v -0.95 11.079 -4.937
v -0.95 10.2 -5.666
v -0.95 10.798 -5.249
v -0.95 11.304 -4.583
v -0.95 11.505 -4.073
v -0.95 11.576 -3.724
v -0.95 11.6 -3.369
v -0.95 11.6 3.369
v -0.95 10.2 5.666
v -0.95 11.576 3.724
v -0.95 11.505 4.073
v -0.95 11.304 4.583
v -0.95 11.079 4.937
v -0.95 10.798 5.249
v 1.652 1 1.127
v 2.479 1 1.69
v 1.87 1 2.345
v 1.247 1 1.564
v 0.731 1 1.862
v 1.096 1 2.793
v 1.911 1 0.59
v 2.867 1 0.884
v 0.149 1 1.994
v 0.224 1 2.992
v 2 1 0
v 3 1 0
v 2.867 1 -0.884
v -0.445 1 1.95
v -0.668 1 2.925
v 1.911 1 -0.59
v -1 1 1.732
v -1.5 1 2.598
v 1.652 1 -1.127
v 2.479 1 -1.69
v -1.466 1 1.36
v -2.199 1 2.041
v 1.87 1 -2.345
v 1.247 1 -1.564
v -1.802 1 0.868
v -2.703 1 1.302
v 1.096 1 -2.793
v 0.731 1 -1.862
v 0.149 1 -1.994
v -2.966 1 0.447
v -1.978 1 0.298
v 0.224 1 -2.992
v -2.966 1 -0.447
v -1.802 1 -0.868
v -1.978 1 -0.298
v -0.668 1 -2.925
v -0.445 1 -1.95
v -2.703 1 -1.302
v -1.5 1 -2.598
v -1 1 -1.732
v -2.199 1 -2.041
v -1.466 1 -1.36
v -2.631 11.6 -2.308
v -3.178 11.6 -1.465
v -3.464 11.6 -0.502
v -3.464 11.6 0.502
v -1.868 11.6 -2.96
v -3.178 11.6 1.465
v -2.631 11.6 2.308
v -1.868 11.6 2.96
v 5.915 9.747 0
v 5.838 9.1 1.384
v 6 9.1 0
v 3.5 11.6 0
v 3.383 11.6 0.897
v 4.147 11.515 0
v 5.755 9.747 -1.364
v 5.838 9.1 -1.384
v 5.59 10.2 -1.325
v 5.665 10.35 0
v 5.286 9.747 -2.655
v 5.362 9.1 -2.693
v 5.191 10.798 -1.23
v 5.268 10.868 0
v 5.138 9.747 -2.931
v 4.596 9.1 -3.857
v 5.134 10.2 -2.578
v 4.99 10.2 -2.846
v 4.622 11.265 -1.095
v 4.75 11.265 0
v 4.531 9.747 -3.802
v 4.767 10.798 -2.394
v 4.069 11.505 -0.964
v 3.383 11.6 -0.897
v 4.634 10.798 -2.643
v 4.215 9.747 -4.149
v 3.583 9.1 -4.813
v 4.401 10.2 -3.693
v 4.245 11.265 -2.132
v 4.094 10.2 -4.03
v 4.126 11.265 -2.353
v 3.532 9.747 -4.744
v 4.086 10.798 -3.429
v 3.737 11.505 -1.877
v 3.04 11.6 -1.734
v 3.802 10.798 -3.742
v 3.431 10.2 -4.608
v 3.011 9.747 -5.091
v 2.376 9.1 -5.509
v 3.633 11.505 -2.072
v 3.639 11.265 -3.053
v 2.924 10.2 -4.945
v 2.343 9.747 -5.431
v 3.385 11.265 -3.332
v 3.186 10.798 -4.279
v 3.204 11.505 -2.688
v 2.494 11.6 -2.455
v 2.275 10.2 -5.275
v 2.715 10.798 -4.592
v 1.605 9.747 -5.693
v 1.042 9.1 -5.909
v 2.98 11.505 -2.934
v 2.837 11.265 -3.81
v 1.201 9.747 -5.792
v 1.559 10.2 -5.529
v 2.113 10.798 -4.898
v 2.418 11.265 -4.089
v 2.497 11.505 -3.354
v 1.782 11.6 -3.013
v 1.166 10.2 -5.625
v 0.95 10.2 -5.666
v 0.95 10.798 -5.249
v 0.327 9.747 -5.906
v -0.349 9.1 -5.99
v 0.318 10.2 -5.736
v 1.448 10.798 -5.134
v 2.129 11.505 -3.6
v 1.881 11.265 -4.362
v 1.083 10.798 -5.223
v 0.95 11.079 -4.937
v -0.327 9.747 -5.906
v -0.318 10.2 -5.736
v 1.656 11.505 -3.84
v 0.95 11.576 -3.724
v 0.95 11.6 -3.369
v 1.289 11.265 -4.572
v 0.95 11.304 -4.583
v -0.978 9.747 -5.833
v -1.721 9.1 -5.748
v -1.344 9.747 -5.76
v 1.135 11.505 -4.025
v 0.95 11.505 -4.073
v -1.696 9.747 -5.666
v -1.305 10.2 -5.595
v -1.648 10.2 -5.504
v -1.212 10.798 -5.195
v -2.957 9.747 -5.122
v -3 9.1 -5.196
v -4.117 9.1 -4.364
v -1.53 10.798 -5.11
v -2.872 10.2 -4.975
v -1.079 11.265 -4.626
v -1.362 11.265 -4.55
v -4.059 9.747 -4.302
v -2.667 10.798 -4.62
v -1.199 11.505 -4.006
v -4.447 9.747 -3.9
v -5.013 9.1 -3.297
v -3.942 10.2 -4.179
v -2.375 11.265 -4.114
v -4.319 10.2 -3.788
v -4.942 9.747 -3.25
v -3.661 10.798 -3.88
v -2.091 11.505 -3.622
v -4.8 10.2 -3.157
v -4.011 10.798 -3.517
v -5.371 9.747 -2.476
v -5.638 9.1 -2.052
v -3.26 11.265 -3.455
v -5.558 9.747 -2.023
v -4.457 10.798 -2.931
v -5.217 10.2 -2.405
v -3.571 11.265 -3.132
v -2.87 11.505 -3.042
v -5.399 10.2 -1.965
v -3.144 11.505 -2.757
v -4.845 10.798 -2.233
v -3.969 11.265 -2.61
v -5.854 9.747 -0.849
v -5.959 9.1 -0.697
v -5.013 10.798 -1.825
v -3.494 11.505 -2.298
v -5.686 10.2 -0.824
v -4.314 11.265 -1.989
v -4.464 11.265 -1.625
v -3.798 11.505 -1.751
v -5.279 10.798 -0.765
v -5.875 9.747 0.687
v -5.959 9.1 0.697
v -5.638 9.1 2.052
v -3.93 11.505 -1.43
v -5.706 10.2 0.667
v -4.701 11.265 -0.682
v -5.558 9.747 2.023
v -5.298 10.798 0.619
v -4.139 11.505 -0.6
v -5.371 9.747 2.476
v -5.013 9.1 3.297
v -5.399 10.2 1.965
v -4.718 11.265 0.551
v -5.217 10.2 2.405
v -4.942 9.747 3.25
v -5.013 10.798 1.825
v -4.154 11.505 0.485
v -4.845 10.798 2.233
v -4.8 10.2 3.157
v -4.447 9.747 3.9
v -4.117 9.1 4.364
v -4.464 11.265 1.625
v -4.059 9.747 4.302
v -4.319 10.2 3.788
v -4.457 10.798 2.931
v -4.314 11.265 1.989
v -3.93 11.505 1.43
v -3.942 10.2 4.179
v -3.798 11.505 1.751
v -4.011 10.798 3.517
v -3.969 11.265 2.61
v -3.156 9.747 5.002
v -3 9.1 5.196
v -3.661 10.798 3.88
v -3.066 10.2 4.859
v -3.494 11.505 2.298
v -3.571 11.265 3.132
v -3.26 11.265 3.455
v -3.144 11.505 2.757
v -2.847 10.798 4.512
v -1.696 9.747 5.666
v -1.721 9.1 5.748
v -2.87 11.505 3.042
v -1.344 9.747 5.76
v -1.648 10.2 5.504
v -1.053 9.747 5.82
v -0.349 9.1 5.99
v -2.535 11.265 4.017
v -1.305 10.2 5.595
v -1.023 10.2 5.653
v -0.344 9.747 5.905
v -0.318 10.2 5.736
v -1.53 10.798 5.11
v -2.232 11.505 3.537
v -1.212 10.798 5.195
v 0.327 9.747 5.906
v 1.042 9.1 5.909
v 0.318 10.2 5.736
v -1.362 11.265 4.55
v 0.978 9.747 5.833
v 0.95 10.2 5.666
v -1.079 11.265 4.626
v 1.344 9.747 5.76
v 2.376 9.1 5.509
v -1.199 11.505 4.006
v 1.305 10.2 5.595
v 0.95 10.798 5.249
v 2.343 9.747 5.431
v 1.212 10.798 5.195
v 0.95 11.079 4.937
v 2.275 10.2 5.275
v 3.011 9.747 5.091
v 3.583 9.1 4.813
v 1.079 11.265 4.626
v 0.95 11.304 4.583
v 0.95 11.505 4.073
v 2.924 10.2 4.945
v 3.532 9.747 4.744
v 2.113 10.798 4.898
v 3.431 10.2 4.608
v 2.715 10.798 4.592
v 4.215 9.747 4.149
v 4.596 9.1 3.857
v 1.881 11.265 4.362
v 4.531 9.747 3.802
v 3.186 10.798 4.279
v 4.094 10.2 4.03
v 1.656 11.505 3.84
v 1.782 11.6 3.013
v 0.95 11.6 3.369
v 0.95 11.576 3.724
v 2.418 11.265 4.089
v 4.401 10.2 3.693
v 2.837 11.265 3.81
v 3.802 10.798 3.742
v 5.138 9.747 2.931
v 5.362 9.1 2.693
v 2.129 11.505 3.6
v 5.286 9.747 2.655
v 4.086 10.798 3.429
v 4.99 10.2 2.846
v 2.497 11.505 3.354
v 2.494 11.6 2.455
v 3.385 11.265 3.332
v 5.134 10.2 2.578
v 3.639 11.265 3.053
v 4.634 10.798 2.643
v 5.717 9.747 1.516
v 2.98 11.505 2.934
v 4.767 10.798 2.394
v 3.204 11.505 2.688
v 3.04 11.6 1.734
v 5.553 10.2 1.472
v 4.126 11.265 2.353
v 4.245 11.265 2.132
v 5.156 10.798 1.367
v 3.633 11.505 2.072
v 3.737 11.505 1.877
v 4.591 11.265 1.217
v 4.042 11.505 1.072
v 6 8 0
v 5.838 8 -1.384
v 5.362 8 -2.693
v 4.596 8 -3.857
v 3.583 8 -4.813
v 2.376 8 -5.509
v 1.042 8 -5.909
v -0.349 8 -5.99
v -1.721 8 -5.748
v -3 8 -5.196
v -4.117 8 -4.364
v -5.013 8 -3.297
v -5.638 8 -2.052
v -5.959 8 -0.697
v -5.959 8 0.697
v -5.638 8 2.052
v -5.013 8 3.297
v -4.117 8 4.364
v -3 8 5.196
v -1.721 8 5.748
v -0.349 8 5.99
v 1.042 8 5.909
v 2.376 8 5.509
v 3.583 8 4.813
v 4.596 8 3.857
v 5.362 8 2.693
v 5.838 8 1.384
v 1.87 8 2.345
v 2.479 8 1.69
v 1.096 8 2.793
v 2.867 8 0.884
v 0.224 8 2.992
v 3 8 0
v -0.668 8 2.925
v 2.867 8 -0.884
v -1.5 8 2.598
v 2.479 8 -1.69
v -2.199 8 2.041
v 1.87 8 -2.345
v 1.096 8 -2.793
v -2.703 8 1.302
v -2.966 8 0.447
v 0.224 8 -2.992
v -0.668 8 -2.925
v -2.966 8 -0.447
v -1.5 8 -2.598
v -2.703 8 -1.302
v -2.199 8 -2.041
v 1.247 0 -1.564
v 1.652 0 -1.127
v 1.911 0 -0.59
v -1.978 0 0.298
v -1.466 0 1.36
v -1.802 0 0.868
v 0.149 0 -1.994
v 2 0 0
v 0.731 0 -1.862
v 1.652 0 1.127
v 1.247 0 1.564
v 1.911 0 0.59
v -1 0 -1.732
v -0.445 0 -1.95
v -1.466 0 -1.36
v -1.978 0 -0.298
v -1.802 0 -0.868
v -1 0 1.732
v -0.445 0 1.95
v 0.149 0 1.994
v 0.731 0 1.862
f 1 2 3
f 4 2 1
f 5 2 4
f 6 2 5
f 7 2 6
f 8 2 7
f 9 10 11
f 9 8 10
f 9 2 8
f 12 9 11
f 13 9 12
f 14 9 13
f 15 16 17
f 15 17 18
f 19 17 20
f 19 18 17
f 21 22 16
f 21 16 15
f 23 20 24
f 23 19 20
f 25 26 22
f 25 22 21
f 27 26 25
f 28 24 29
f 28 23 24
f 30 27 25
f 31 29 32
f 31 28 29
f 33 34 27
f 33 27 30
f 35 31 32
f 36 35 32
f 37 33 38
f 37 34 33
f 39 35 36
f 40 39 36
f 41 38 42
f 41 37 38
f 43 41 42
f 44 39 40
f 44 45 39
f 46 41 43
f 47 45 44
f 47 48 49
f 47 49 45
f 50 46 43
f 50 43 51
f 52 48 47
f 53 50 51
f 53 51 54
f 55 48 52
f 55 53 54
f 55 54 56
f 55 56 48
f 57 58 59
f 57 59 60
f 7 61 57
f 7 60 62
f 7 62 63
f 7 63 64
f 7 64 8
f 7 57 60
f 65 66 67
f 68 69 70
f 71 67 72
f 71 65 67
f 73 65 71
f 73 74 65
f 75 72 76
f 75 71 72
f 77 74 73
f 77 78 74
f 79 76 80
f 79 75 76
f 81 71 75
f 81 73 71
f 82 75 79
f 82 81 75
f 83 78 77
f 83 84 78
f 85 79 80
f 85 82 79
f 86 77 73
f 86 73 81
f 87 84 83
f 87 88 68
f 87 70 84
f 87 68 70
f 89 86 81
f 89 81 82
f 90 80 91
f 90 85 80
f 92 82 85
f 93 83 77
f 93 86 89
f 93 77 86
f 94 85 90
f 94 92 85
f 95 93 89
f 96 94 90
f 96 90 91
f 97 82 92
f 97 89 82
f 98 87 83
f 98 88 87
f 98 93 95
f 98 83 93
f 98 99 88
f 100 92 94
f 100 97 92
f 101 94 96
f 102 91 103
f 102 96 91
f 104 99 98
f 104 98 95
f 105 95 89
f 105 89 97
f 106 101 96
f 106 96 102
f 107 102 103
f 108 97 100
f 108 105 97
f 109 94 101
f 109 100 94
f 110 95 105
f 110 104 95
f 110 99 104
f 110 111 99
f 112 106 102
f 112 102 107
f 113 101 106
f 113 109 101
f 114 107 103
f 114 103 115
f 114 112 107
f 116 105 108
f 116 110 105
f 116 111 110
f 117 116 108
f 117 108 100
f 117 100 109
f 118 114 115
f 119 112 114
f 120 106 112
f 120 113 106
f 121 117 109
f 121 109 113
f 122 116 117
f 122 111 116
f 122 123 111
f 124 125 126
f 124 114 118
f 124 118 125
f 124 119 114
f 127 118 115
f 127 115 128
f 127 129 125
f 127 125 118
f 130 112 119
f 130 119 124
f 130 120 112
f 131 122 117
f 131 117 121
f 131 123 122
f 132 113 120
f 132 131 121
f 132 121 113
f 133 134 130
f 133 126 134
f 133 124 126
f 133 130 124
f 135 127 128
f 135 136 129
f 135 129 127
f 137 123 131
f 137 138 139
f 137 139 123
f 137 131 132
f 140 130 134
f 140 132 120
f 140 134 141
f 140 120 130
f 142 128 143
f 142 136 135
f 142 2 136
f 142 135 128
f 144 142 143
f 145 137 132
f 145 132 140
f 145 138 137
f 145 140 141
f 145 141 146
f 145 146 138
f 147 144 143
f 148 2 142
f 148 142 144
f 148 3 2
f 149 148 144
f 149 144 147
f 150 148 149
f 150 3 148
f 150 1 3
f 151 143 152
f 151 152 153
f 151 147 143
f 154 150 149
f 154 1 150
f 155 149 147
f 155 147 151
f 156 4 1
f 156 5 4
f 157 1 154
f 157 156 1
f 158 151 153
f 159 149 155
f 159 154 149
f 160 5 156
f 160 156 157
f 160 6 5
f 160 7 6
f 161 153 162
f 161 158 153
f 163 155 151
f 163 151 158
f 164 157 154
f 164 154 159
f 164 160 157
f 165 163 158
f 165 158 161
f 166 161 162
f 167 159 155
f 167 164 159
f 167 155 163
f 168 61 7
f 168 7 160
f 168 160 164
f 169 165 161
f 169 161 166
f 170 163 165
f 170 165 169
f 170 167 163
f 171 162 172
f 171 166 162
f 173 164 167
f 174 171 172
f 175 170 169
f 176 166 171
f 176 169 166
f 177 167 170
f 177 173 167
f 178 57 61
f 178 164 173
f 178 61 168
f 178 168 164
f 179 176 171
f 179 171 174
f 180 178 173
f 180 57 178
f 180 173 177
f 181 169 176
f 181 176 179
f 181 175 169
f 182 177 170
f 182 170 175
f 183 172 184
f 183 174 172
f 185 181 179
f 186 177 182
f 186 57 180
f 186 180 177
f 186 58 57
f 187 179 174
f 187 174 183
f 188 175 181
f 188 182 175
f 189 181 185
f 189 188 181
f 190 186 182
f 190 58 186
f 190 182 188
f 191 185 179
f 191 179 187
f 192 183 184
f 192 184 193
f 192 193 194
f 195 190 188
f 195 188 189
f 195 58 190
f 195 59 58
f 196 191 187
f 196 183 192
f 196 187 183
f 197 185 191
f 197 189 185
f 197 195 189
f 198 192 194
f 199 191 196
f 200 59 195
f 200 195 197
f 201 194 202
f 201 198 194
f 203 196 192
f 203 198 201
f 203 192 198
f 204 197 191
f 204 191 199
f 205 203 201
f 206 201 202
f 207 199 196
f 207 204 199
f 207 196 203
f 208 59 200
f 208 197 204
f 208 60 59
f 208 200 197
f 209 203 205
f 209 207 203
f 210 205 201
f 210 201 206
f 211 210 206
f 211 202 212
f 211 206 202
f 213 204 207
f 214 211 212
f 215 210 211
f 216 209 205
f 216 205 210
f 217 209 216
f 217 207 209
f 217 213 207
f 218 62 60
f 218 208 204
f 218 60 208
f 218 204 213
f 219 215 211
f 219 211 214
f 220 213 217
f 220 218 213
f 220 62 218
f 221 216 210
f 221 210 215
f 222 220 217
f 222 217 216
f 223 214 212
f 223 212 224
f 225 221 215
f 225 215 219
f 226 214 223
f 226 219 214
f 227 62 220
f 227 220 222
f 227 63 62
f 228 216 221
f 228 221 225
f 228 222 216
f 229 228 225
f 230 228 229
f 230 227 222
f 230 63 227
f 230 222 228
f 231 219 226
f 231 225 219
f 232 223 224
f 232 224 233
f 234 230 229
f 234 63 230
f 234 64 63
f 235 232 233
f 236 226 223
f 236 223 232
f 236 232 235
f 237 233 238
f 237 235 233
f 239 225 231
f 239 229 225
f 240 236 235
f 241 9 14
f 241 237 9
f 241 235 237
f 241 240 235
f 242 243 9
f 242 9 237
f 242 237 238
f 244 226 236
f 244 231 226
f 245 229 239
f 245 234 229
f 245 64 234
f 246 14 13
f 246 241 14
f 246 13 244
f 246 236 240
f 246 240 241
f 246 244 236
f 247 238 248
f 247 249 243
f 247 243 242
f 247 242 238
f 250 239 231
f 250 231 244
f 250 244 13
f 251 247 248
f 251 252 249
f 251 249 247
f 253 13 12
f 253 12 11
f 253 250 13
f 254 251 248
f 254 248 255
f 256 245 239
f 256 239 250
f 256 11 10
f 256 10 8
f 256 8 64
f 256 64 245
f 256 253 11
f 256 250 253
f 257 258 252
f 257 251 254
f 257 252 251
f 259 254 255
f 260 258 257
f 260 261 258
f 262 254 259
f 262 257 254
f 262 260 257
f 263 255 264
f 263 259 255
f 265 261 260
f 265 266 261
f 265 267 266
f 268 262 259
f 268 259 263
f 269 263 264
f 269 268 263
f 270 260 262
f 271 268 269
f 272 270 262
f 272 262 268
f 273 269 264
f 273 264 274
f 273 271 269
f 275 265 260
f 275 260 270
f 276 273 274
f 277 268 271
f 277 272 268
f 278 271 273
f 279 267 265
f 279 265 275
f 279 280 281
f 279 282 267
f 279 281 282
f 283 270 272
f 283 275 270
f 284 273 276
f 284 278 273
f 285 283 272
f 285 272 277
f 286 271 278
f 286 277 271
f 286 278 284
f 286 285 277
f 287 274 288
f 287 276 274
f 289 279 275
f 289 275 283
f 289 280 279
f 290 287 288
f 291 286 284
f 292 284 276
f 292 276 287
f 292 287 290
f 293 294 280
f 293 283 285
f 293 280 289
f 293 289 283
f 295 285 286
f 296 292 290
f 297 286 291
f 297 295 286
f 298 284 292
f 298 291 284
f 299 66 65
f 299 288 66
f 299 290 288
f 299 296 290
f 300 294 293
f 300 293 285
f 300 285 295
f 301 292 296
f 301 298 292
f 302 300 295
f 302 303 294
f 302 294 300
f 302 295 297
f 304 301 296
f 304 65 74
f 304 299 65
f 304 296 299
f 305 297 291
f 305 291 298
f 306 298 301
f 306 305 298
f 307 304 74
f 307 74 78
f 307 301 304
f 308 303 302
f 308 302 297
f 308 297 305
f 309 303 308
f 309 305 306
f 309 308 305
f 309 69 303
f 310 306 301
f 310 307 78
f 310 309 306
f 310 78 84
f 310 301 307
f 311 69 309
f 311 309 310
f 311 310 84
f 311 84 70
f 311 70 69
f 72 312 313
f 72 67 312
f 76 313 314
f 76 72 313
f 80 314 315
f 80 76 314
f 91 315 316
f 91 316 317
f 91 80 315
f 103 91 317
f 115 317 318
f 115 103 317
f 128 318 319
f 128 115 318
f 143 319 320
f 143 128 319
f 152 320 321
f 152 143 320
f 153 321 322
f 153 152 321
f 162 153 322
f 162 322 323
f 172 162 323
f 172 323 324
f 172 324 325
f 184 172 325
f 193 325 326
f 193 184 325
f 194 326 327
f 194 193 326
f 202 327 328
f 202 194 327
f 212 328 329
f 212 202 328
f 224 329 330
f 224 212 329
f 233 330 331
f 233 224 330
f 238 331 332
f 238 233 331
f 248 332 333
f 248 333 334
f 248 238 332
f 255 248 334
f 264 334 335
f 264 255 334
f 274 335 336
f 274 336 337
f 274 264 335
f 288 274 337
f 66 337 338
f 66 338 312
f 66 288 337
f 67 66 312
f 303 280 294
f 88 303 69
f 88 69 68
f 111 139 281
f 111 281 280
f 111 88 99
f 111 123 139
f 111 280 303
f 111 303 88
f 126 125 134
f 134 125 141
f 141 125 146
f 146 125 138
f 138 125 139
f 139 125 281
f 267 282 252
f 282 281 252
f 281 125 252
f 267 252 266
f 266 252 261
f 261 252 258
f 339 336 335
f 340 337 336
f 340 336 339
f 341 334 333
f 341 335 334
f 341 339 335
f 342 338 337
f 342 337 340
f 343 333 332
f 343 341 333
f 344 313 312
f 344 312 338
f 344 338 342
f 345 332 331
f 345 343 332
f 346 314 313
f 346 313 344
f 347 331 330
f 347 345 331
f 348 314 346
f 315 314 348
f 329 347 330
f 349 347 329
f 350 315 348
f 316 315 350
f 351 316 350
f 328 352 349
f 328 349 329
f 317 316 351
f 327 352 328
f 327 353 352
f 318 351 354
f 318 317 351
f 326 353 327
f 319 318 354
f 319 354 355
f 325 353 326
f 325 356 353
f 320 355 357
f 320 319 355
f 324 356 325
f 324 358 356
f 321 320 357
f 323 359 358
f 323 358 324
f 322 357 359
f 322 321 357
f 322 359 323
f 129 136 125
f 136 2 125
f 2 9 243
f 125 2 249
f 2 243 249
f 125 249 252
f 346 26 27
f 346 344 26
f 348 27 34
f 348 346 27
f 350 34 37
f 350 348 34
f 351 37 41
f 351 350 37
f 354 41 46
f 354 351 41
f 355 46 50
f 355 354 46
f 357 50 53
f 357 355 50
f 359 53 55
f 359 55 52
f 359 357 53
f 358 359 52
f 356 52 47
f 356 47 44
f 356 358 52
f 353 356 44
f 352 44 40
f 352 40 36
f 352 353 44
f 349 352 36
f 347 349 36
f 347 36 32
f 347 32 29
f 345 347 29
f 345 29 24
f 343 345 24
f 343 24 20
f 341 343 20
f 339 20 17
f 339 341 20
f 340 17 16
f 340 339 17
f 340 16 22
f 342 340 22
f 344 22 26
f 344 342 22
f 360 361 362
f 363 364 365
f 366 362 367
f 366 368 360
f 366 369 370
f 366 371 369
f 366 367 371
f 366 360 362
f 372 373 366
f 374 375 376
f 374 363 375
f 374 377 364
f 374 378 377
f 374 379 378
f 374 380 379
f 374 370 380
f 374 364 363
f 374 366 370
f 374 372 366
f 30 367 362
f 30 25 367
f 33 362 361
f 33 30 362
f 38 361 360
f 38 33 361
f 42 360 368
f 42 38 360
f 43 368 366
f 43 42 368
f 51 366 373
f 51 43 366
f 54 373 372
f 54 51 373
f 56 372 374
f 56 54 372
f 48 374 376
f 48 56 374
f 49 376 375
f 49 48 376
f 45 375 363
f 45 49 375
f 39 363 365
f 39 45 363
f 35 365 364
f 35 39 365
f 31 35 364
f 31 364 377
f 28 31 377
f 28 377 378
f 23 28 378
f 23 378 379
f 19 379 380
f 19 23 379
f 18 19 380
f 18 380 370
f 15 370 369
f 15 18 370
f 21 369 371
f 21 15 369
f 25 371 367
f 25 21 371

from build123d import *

# Parameters (mm, degrees)
SKETCH2_W               = 1.9
SKETCH2_H               = 1.4
CUT_EXTRUDE1_DEPTH      = 7
CUT_EXTRUDE1_DEPTH_BACK = 7


with BuildPart() as part:
    # Sketch1 → Revolve1 (revolve)
    with BuildSketch(Plane.XY):
        with BuildLine():
            Line((0, 0), (2, 0))
            Line((2, 0), (2, 1))
            Line((2, 1), (3, 1))
            Line((3, 1), (3, 8))
            Line((3, 8), (6, 8))
            Line((6, 8), (6, 9.1))
            ThreePointArc((6, 9.1), (5.267766953, 10.867766953), (3.5, 11.6))
            Line((3.5, 11.6), (0, 11.6))
            Line((0, 11.6), (0, 0))
        make_face()
    revolve(axis=Axis((0, 0, 0), (0, 1, 0)))

    # Sketch2 → Cut-Extrude1 (cut, two sides)
    with BuildSketch(Plane.XY) as cut_extrude1_sk:
        with Locations((0, 10.9)):
            Rectangle(SKETCH2_W, SKETCH2_H)
    extrude(amount=CUT_EXTRUDE1_DEPTH, mode=Mode.SUBTRACT)
    extrude(cut_extrude1_sk.sketch, amount=-CUT_EXTRUDE1_DEPTH_BACK, mode=Mode.SUBTRACT)


solid = part.part
